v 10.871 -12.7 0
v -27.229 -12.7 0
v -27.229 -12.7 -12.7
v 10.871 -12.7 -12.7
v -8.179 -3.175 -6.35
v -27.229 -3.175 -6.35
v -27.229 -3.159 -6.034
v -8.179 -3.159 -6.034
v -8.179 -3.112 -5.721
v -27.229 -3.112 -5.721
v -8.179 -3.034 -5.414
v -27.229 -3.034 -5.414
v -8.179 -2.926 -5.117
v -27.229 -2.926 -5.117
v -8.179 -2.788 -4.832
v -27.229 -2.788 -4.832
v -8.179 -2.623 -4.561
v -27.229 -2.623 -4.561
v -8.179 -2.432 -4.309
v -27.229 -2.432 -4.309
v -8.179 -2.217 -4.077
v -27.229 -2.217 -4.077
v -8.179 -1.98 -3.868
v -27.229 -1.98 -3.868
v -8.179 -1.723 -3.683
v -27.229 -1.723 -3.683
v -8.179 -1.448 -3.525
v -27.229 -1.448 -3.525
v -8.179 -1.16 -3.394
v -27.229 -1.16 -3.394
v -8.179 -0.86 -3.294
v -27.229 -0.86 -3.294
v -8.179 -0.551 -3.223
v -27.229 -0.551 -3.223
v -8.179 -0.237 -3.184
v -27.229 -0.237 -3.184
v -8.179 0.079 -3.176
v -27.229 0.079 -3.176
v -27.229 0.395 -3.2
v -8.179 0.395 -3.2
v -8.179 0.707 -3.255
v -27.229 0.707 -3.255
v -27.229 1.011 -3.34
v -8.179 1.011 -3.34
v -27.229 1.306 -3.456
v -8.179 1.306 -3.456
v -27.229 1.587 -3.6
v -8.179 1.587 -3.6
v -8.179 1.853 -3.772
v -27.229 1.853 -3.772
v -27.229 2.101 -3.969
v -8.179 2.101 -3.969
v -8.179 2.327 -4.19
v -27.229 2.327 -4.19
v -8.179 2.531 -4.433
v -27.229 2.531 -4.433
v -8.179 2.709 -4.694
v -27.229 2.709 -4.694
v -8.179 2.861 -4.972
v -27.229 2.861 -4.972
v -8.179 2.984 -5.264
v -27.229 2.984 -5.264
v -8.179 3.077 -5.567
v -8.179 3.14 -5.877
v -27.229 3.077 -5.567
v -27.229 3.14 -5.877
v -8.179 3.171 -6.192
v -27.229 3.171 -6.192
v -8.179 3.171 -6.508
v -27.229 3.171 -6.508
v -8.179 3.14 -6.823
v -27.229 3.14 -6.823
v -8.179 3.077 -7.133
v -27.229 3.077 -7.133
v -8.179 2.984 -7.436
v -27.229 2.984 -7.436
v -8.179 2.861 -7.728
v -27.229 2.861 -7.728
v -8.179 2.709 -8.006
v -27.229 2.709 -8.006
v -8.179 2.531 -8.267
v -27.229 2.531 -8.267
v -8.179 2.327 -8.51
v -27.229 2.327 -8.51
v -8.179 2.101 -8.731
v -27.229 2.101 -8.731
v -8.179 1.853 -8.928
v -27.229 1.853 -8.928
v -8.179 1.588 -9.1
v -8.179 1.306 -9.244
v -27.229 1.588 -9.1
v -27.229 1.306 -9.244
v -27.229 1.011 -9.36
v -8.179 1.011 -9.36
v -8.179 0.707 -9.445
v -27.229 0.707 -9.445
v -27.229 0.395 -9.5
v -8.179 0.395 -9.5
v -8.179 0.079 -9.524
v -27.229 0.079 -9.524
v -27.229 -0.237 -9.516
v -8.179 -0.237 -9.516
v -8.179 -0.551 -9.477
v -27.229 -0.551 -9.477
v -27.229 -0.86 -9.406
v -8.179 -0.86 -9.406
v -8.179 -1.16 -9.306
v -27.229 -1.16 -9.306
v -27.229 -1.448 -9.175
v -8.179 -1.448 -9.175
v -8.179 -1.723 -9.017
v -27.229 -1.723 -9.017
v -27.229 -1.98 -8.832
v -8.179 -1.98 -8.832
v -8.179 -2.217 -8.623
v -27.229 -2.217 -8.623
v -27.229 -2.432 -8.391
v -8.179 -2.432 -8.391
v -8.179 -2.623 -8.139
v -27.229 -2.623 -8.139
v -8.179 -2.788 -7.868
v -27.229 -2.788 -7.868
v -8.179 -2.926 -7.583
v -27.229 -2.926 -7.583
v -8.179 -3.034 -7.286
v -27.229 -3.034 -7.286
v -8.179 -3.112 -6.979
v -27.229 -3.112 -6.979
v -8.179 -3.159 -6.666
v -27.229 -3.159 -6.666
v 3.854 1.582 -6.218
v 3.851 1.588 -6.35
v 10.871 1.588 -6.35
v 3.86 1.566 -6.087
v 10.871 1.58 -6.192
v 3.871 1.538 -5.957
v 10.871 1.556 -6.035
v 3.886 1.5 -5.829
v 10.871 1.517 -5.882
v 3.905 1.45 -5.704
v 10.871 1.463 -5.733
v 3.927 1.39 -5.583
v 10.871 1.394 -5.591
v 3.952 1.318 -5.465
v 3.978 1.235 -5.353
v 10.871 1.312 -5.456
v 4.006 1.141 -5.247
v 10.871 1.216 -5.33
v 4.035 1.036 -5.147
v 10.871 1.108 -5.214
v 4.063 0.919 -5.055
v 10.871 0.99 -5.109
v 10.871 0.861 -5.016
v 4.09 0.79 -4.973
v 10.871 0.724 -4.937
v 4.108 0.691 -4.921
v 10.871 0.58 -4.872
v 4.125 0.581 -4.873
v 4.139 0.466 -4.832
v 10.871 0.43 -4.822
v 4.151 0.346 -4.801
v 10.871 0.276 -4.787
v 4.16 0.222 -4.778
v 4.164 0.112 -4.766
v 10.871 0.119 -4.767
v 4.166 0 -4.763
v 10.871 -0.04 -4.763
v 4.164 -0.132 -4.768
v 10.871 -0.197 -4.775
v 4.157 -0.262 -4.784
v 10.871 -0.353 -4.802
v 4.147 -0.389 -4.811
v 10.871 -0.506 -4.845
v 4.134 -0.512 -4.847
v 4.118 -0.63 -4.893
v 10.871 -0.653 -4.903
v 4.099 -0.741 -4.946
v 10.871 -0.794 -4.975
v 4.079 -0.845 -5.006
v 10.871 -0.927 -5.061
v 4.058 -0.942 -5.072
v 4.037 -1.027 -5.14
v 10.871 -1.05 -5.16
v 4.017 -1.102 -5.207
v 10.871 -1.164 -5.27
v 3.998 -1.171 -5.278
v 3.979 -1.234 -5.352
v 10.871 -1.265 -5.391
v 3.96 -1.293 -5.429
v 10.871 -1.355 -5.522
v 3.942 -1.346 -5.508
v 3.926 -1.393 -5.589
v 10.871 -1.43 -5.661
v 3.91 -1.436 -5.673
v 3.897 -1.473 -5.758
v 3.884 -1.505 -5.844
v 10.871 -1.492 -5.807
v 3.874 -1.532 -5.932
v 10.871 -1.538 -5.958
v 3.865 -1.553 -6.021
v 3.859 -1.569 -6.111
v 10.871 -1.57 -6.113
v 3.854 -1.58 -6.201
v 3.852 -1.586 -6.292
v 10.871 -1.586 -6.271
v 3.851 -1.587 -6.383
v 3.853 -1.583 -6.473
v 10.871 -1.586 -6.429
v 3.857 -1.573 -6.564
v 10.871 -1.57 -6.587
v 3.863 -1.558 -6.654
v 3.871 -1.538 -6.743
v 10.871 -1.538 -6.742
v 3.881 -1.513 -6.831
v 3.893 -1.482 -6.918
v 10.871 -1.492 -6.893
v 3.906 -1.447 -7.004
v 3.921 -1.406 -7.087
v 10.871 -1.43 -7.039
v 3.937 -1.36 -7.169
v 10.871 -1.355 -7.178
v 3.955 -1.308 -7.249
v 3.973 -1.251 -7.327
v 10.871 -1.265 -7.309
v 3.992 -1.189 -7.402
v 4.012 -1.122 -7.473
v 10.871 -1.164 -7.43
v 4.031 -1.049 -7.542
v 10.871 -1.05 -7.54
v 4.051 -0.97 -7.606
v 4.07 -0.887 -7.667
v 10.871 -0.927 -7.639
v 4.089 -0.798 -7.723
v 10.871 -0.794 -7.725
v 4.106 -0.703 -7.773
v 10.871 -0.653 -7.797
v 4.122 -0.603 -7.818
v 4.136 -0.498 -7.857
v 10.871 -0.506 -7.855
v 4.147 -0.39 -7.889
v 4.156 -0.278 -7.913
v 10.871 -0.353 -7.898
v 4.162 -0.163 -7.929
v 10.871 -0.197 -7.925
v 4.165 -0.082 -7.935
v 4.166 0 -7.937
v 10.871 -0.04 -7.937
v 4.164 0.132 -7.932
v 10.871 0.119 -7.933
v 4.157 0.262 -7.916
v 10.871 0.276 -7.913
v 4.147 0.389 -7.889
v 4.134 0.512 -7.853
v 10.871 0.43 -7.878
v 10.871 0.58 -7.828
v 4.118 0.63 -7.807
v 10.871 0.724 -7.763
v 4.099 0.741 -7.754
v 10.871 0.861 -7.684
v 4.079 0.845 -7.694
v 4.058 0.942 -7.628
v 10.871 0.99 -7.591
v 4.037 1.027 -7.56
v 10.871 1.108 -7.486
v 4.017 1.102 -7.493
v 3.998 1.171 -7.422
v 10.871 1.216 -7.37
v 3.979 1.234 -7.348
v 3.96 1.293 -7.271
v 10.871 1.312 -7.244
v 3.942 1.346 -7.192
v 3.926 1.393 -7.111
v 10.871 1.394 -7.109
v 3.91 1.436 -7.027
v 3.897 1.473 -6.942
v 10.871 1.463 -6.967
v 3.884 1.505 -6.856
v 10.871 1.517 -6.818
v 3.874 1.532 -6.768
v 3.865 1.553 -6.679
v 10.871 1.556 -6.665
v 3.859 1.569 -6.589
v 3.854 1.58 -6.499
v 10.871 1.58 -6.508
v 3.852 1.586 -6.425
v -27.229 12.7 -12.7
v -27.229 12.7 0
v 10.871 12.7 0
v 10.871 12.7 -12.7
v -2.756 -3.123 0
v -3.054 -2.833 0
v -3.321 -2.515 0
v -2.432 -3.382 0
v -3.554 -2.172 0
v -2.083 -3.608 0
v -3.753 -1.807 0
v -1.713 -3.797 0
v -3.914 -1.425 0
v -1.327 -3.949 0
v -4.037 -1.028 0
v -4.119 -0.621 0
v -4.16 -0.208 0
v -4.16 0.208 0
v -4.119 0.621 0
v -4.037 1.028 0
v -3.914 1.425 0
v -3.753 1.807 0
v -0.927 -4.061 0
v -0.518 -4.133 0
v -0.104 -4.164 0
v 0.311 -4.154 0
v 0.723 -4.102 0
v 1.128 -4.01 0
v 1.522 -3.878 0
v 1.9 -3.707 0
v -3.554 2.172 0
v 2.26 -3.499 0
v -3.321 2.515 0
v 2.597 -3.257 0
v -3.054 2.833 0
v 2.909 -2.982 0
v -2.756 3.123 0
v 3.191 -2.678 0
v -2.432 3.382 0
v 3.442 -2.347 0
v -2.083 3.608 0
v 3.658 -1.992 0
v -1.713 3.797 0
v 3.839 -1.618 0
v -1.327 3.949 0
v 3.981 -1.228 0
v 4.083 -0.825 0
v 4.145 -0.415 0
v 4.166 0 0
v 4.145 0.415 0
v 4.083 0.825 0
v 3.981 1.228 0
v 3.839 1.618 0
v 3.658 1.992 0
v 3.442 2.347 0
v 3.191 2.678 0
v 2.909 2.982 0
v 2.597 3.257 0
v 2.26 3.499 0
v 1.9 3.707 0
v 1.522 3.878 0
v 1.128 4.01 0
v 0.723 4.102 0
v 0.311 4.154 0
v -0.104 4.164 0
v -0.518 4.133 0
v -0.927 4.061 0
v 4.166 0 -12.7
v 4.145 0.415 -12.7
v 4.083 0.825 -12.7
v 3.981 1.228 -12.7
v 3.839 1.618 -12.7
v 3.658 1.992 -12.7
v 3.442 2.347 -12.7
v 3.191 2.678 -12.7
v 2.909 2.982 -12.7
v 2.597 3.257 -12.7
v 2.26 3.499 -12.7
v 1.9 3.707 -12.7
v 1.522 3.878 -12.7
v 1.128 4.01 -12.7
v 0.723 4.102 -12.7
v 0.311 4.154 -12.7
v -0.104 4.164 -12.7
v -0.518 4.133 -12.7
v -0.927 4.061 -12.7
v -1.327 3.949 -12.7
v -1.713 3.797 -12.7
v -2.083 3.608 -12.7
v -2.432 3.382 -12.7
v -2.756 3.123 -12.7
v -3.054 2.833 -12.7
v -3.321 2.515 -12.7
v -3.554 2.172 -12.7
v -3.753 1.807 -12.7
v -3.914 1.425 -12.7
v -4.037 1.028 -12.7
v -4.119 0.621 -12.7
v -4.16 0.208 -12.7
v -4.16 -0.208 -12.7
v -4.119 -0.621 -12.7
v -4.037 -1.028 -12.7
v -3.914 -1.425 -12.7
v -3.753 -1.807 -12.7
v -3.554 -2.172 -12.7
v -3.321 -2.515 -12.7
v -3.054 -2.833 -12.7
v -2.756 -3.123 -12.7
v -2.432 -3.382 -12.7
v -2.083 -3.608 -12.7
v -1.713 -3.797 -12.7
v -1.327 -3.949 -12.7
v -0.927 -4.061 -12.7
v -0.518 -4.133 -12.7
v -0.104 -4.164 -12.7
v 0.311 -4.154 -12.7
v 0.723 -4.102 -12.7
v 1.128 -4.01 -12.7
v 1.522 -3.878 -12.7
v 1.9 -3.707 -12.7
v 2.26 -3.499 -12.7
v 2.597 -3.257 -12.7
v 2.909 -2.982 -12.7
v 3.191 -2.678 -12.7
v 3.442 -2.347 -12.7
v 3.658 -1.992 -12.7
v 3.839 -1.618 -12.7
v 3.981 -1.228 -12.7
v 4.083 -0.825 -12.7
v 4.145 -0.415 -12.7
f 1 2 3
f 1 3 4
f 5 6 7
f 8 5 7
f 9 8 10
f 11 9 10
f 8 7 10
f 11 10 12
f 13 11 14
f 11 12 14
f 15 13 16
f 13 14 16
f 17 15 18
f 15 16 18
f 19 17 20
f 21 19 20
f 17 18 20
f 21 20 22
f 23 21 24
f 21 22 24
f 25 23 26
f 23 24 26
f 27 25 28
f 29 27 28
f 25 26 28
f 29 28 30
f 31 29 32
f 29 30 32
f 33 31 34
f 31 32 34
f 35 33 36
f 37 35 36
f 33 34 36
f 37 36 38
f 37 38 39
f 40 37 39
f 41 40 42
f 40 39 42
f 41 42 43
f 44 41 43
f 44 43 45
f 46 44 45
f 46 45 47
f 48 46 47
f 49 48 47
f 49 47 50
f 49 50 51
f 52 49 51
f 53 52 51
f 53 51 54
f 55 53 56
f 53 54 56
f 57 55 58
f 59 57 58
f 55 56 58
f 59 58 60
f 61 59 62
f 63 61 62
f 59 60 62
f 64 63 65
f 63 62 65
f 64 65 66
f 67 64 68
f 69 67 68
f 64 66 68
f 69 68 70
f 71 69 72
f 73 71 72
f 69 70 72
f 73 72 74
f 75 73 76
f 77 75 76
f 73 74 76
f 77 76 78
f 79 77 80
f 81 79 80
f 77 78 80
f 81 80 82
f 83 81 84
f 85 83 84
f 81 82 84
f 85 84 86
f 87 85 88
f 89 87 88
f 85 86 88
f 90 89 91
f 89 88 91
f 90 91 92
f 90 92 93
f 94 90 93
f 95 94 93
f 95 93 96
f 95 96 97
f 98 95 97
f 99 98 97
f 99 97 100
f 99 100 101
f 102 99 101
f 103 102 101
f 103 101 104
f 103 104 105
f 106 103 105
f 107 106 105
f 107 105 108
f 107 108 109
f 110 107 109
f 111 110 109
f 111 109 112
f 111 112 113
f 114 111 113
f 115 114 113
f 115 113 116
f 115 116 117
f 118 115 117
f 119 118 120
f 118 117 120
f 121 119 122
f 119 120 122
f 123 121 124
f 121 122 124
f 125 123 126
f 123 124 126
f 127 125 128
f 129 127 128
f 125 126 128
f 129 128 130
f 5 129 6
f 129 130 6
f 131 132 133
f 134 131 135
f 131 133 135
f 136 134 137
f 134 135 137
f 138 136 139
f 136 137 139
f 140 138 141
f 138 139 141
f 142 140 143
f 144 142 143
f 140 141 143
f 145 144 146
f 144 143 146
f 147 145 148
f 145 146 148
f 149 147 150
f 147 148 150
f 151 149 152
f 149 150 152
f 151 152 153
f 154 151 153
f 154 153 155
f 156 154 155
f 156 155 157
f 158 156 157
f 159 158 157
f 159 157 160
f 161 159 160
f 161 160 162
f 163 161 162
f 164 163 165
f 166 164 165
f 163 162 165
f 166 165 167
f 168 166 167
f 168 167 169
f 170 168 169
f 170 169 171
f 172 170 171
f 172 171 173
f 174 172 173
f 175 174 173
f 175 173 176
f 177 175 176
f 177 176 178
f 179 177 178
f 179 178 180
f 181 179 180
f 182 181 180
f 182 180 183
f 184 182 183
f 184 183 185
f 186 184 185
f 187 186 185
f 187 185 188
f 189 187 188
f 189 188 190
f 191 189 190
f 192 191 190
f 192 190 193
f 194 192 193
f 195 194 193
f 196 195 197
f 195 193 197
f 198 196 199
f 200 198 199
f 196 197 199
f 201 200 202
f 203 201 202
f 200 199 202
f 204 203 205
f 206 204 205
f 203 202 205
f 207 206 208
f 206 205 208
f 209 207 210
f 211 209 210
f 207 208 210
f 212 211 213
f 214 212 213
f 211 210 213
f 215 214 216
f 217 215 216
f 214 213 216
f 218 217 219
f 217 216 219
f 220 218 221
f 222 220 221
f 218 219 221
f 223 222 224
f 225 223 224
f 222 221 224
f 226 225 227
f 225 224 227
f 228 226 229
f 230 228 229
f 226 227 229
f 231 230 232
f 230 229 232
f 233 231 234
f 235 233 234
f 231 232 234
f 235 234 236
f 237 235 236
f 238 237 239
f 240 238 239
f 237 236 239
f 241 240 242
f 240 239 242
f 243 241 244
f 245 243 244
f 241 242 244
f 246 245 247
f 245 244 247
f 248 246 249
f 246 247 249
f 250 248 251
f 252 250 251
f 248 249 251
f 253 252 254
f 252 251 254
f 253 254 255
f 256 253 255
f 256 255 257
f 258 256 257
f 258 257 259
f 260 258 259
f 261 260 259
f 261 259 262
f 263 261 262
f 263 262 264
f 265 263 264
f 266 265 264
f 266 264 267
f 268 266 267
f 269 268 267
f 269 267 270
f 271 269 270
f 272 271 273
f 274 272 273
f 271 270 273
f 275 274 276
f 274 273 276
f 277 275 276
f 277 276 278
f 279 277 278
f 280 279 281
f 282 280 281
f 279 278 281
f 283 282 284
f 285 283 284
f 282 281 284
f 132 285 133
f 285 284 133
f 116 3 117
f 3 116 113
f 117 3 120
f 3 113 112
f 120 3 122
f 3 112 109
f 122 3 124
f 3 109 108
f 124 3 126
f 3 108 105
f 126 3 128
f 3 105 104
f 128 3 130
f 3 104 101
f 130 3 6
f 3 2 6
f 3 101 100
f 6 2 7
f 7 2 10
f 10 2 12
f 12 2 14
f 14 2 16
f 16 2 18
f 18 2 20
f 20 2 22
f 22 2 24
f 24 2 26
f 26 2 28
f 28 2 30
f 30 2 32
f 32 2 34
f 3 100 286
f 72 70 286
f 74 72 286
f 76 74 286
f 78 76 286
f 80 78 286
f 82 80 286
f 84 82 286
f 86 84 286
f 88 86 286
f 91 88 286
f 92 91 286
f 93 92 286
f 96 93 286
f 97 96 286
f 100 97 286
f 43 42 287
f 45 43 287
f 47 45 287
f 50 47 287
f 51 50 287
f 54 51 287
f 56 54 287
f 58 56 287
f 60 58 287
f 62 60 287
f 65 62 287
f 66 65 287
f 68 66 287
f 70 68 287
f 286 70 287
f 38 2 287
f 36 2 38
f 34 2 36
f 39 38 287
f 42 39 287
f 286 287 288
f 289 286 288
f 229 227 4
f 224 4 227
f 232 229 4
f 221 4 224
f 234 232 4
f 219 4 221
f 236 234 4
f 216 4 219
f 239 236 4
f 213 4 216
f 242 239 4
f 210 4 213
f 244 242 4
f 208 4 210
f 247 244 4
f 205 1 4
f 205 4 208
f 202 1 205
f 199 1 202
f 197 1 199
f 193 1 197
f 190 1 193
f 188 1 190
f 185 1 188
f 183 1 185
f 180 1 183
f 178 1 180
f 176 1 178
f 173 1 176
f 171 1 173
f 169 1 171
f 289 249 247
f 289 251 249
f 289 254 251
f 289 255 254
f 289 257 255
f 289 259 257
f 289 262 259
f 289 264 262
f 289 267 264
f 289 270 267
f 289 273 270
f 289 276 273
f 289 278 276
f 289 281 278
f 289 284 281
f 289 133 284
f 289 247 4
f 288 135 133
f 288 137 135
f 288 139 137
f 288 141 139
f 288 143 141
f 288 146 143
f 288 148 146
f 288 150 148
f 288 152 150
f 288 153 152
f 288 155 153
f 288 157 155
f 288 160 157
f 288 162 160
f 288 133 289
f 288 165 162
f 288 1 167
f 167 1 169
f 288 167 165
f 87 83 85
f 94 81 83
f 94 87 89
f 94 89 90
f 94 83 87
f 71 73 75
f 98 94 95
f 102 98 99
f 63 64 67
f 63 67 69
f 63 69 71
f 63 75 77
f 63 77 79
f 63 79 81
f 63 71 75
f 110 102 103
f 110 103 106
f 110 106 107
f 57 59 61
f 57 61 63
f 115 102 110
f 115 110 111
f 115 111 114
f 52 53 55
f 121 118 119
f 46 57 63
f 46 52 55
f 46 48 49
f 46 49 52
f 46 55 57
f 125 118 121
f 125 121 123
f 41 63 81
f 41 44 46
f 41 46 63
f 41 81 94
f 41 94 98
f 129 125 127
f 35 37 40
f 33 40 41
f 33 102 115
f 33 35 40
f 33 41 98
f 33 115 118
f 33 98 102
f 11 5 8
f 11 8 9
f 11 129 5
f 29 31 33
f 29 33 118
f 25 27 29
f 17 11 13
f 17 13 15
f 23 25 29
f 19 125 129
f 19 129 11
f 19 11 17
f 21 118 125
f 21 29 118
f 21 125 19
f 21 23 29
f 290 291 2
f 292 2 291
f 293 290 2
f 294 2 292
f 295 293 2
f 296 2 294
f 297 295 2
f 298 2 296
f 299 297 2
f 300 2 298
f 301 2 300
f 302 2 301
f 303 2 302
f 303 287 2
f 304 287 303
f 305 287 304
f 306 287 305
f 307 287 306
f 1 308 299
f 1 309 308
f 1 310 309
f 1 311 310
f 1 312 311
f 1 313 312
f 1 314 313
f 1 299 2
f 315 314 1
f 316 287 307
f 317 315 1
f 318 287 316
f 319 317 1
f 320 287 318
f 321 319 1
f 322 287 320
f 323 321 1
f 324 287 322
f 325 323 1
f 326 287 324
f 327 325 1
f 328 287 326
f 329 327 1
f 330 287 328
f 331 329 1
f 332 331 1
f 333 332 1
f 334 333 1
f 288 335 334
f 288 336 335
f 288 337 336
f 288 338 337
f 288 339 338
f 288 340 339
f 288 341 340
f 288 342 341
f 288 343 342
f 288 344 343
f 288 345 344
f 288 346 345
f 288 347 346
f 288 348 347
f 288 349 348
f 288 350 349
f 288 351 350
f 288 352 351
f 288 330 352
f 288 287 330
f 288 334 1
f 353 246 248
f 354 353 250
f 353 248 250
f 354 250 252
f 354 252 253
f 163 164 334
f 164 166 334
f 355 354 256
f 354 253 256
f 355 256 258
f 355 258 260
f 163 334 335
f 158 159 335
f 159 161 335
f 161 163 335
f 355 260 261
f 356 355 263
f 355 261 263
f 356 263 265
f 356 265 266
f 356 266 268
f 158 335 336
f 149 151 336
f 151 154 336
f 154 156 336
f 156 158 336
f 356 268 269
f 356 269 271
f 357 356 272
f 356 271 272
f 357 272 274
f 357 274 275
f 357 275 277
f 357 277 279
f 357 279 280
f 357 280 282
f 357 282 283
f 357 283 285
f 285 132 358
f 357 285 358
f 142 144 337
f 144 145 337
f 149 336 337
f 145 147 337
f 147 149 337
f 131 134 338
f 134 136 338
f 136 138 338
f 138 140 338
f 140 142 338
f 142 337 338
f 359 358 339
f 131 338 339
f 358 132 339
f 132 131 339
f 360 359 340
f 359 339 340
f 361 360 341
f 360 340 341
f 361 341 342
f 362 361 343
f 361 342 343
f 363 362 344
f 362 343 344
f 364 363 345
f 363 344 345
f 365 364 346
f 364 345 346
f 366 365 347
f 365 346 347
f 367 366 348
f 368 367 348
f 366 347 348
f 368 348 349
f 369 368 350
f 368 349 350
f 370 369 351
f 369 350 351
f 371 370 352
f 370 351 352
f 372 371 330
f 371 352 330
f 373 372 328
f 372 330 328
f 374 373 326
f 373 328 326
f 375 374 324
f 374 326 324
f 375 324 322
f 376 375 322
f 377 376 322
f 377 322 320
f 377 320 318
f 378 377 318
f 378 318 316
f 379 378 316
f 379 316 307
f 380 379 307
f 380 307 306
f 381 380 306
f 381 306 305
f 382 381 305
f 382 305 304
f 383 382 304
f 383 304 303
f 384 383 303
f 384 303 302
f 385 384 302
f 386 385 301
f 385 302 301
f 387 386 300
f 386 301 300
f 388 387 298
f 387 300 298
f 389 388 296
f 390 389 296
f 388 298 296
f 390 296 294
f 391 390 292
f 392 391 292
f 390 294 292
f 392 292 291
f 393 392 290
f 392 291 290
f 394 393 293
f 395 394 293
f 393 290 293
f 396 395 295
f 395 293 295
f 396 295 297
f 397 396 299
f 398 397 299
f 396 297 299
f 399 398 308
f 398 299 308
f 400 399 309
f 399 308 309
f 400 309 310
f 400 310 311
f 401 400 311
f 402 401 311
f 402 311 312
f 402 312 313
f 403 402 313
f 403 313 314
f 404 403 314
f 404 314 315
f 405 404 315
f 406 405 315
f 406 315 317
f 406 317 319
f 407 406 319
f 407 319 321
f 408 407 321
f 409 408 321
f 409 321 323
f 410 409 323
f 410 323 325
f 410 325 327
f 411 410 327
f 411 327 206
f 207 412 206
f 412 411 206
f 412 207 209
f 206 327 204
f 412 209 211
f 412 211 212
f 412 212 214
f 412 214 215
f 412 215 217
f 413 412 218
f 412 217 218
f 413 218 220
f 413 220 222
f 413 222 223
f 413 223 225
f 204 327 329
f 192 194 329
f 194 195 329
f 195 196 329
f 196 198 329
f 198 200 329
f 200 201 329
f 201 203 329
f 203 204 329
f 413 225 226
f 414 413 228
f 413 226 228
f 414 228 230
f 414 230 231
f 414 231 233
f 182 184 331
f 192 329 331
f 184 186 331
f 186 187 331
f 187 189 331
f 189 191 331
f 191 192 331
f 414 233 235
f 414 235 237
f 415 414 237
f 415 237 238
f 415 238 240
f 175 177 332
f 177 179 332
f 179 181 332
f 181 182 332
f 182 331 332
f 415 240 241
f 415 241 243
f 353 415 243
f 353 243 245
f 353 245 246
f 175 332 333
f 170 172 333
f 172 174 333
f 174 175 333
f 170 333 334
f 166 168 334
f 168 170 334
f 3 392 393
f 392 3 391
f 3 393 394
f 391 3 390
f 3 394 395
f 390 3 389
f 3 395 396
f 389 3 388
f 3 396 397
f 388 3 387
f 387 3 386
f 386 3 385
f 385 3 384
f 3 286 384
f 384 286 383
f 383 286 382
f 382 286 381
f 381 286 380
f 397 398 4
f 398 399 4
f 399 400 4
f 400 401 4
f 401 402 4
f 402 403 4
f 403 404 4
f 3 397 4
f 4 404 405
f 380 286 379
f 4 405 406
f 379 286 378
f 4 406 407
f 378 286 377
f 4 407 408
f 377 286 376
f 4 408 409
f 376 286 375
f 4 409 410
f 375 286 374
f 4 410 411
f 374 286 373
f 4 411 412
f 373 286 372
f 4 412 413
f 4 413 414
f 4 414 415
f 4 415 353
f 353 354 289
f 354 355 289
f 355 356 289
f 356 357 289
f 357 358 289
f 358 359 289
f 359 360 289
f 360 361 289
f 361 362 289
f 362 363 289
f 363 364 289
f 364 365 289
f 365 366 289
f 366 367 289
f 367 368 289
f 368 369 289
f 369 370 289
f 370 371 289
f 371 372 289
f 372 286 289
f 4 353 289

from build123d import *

# Parameters (mm, degrees)
F0_W     = 38.1
F0_H     = 25.4
F0_R     = 4.1656
F1_DEPTH = 12.7
F2_R     = 3.175
F3_DEPTH = 19.05
F4_R     = 1.5875
F5_DEPTH = 12.7


with BuildPart() as f1:
    # F0 (on Top) → F1 (new body)
    with BuildSketch(Plane.XY):
        with Locations((-8.1788, 0)):
            Rectangle(F0_W, F0_H)
        Circle(F0_R, mode=Mode.SUBTRACT)
    extrude(amount=-F1_DEPTH)

    # F2 (on face) → F3 (cut)
    with BuildSketch(Plane(origin=(-27.2288, 0, 0), x_dir=(0, -1, 0), z_dir=(-1, 0, 0))):
        with Locations((0, -6.35)):
            Circle(F2_R)
    extrude(amount=-F3_DEPTH, mode=Mode.SUBTRACT)

    # F4 (on face) → F5 (cut)
    with BuildSketch(Plane.YZ.offset(10.8712)):
        with Locations((0, -6.35)):
            Circle(F4_R)
    extrude(amount=-F5_DEPTH, mode=Mode.SUBTRACT)


solid = f1.part
